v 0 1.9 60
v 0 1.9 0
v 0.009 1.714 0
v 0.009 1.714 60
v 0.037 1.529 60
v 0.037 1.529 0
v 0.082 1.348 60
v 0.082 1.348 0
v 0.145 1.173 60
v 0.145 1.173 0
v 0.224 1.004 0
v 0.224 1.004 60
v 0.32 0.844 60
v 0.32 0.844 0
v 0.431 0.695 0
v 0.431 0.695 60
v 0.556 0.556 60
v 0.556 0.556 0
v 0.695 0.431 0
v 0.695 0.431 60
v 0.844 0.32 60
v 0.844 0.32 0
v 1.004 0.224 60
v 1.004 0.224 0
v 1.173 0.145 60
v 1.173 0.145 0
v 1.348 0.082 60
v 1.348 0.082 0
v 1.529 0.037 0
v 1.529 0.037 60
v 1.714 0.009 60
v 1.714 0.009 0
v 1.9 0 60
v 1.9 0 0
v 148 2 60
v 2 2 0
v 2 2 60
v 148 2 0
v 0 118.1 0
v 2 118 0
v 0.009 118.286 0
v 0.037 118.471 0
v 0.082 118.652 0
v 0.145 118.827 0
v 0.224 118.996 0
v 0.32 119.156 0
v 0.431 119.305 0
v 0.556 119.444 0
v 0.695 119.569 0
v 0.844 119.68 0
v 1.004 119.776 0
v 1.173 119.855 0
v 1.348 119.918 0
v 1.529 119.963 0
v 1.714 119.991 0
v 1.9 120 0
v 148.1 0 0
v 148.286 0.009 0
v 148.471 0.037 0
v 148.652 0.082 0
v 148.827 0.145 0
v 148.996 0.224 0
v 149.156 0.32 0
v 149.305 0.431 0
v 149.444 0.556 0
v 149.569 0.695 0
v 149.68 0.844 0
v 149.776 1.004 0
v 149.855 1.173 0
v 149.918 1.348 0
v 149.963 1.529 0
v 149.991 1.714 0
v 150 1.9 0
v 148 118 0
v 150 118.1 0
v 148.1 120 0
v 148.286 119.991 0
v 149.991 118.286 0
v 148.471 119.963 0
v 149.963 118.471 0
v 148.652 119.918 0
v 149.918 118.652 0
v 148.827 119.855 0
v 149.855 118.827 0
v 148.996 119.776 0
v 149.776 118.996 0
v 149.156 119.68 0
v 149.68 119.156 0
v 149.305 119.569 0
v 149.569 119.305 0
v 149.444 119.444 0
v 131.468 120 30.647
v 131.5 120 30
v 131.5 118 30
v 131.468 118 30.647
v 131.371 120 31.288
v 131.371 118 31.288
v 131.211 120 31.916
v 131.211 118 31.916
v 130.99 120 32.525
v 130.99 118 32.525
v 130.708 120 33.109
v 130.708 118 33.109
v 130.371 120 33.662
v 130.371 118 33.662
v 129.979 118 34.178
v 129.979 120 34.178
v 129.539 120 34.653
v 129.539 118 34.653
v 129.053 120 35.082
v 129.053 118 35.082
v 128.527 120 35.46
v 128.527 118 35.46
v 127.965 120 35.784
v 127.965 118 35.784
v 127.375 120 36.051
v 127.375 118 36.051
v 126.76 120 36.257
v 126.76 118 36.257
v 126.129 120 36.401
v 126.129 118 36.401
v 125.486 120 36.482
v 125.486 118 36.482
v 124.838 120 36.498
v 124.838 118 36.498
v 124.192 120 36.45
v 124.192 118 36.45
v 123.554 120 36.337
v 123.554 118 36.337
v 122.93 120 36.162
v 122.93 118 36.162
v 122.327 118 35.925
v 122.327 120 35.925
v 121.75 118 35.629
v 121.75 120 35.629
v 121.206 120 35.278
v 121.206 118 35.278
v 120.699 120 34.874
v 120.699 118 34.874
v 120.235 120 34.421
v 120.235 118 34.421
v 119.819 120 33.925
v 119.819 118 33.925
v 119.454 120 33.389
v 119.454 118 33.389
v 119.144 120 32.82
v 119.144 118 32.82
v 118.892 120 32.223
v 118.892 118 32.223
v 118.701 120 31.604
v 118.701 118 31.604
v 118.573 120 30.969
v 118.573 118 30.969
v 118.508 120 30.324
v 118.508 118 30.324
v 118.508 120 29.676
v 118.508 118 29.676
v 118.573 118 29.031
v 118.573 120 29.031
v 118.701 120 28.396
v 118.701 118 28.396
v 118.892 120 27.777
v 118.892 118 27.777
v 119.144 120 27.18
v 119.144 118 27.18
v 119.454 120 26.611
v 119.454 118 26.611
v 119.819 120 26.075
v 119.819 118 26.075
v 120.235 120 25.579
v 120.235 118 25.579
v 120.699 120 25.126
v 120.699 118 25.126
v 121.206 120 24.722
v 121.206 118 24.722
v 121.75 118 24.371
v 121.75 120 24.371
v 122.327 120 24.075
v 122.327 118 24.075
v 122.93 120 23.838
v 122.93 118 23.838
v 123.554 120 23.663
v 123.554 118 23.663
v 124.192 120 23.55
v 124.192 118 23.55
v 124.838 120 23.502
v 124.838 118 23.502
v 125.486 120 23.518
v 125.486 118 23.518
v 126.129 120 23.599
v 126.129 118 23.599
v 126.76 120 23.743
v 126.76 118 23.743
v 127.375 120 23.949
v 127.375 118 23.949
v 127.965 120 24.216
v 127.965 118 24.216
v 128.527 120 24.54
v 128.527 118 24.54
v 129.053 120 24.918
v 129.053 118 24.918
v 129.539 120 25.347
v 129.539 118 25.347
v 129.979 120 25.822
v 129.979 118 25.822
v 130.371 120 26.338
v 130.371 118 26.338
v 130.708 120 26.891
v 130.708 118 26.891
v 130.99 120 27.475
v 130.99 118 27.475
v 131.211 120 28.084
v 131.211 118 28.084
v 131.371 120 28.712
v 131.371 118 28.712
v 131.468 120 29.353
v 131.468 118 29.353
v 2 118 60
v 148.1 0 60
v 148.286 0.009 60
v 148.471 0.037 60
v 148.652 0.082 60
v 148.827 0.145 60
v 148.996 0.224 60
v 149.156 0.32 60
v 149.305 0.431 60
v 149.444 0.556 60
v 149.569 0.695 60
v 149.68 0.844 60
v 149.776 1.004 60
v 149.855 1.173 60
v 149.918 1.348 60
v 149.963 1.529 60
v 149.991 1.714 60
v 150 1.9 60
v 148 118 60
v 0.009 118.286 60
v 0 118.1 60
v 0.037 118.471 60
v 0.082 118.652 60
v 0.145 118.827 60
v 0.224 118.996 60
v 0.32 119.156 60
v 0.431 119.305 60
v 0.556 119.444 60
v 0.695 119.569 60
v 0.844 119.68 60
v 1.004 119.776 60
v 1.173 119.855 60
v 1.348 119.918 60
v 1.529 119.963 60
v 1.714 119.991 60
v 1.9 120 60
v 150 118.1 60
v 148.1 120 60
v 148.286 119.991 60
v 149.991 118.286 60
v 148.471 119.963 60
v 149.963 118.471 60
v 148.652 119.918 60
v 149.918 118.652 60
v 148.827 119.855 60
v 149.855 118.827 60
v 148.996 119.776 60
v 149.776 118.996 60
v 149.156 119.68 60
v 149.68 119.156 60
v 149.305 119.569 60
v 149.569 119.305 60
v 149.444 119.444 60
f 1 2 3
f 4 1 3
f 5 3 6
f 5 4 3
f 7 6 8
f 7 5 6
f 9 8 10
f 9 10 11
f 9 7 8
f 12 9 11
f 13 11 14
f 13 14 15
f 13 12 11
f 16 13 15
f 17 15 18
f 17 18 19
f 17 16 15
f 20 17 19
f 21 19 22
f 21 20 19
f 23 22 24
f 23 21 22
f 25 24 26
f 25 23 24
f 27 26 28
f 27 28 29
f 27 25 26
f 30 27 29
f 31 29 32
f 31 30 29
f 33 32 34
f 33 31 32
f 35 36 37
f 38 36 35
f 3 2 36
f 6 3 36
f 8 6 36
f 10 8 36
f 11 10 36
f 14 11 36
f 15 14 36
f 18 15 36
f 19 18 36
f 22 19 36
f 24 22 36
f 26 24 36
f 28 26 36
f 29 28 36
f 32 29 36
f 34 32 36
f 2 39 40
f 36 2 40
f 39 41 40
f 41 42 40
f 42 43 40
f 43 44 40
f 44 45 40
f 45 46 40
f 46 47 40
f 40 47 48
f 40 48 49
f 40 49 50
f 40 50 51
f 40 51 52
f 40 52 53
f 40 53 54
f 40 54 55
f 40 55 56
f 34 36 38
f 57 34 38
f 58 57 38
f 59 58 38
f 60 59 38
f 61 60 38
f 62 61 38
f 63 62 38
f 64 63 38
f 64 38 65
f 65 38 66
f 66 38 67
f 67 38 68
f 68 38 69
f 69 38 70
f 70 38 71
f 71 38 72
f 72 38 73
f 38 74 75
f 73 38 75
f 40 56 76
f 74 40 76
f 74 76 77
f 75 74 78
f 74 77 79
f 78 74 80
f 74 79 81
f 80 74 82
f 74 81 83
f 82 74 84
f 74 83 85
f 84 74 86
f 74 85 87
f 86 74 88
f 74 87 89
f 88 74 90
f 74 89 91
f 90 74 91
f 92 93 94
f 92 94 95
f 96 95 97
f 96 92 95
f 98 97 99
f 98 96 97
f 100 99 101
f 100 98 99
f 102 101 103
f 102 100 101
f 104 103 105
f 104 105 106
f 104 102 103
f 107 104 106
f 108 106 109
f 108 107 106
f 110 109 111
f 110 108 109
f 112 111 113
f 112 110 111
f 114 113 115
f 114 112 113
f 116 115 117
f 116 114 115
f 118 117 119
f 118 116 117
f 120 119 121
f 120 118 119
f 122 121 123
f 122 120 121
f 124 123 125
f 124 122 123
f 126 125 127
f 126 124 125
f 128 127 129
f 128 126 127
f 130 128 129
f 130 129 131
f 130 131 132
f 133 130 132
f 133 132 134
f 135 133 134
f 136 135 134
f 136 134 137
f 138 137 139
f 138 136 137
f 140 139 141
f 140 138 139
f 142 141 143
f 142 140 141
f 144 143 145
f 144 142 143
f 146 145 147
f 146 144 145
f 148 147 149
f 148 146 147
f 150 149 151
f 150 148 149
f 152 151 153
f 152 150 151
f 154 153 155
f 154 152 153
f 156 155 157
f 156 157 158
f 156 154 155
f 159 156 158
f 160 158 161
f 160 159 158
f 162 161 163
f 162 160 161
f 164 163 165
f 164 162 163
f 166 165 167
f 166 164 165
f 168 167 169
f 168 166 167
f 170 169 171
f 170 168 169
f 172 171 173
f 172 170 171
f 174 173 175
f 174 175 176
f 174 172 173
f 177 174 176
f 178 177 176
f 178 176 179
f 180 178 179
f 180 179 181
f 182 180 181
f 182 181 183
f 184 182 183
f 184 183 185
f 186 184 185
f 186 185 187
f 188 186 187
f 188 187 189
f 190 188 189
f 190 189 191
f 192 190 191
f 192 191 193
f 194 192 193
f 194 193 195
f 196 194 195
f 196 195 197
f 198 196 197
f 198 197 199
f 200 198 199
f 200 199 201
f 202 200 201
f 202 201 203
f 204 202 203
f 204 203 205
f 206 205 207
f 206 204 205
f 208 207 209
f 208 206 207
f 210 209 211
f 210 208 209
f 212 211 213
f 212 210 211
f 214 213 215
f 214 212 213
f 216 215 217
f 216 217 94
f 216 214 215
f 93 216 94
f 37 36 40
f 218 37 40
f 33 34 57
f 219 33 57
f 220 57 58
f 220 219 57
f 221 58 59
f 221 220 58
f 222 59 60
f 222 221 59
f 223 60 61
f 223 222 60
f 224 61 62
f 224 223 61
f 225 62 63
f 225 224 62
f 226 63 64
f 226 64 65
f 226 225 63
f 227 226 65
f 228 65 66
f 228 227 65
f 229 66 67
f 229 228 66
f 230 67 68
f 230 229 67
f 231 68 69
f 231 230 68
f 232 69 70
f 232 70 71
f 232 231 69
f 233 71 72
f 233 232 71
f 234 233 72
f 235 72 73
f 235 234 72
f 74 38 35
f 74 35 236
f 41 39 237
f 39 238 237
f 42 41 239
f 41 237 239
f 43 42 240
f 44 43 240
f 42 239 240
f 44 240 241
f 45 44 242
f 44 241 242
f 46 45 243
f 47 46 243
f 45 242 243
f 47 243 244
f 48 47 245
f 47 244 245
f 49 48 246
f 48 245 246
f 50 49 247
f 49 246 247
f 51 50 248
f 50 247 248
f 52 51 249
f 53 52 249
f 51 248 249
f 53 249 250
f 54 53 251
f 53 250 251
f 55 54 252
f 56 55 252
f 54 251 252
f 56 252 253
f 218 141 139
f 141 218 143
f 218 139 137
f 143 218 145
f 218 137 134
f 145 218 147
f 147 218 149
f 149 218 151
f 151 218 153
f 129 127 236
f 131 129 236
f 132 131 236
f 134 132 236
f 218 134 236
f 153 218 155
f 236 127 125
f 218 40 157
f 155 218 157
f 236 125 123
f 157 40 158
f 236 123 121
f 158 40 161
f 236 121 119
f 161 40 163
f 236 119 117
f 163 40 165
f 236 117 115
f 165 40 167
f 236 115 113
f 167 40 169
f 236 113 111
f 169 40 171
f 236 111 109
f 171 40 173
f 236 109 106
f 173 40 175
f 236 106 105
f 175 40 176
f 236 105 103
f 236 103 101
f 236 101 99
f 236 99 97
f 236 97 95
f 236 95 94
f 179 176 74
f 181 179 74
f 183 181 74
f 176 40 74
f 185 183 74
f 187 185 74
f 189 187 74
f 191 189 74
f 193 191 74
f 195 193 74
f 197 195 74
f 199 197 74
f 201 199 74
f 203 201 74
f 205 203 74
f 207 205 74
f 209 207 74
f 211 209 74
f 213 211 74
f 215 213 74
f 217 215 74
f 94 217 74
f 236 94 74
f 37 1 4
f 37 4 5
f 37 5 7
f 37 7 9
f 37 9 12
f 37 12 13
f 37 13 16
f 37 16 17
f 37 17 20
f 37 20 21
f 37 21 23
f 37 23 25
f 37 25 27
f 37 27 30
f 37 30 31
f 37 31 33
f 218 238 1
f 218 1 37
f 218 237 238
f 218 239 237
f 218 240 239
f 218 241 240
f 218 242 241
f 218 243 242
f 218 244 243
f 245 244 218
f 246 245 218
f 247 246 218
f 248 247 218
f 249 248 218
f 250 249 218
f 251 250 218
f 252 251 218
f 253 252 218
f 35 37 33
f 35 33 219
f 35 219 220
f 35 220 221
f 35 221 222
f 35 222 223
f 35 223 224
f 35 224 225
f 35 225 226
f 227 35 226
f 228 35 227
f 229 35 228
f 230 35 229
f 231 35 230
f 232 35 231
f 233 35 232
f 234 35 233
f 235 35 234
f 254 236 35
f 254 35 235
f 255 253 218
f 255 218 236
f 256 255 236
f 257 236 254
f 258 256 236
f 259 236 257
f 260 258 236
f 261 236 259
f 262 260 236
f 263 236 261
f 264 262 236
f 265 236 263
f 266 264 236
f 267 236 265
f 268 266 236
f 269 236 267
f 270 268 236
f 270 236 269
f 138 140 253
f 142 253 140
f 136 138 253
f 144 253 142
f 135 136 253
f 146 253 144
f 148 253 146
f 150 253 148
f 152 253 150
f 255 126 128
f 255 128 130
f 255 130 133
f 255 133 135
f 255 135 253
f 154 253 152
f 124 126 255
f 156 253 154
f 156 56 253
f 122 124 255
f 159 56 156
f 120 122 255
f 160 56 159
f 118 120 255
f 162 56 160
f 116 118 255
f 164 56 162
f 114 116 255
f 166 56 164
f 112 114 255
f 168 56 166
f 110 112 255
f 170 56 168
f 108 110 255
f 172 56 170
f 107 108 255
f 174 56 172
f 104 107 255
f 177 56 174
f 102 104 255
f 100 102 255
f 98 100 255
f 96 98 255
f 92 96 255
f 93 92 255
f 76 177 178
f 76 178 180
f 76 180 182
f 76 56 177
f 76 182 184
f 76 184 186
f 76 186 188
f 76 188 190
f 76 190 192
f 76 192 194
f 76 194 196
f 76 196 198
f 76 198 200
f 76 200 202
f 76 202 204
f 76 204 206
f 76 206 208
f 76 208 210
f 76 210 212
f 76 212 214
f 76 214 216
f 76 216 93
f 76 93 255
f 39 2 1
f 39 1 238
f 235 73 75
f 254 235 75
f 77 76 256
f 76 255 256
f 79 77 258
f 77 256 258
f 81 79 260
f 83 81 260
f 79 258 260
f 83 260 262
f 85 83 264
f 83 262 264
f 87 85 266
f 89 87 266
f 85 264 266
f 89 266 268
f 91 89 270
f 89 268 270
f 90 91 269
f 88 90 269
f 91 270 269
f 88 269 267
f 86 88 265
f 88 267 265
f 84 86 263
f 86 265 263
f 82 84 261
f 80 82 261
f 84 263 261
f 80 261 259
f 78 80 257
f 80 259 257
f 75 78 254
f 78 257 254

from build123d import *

# Parameters (mm, degrees)
SKETCH_W        = 150
SKETCH_H        = 120
PAD_DEPTH       = 60
SKETCH003_W     = 146
SKETCH003_H     = 116
POCKET_DEPTH    = 60
SKETCH004_R     = 6.5
POCKET001_DEPTH = 2
FILLET_R        = 1.9


with BuildPart() as part:
    # Sketch → Pad (new body)
    with BuildSketch(Plane.XY):
        with Locations((75, 60)):
            Rectangle(SKETCH_W, SKETCH_H)
    extrude(amount=PAD_DEPTH)

    # Sketch003 → Pocket (cut)
    with BuildSketch(Plane.XY):
        with Locations((75, 60)):
            Rectangle(SKETCH003_W, SKETCH003_H)
    extrude(amount=POCKET_DEPTH, mode=Mode.SUBTRACT)

    # Sketch004 → Pocket001 (cut)
    with BuildSketch(Plane.XZ.offset(-120)):
        with Locations((125, 30)):
            Circle(SKETCH004_R)
    extrude(amount=POCKET001_DEPTH, mode=Mode.SUBTRACT)

    # Fillet
    fillet_edges = [part.edges().sort_by_distance(p)[0] for p in [
        (150, 0, 30),
        (0, 0, 30),
        (0, 120, 30),
        (150, 120, 30),
    ]]
    fillet(fillet_edges, radius=FILLET_R)


solid = part.part
